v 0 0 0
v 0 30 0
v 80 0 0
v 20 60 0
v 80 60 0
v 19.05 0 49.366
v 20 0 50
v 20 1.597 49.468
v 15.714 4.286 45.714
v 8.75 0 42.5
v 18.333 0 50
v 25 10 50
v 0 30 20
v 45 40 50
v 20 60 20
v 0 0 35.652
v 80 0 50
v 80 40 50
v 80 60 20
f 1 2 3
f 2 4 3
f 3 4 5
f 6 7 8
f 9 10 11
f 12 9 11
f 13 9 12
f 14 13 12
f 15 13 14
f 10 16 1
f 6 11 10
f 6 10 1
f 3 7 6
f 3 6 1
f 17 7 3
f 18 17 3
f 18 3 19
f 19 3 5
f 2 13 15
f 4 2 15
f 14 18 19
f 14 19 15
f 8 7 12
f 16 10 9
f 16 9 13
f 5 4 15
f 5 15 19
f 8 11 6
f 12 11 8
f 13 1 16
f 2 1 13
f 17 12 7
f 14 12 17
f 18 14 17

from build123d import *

# Parameters (mm, degrees)
SKETCH1_W           = 80
SKETCH1_H           = 60
BOSS_EXTRUDE1_DEPTH = 50
CUT_EXTRUDE1_DEPTH  = 50
CUT_EXTRUDE2_DEPTH  = 124
CUT_EXTRUDE3_DEPTH  = 124
CUT_EXTRUDE4_DEPTH  = 124
CUT_EXTRUDE5_DEPTH  = 124
CUT_EXTRUDE6_DEPTH  = 124
CUT_EXTRUDE7_DEPTH  = 124
CUT_EXTRUDE8_DEPTH  = 124
CUT_EXTRUDE9_DEPTH  = 124
CUT_EXTRUDE10_DEPTH = 124
CUT_EXTRUDE11_DEPTH = 124
CUT_EXTRUDE12_DEPTH = 124
CUT_EXTRUDE14_DEPTH = 124
CUT_EXTRUDE15_DEPTH = 124
BOSS_EXTRUDE2_DEPTH = 5
SKETCH27_W          = 80
SKETCH27_H          = 50
CUT_EXTRUDE20_DEPTH = 37


with BuildPart() as part:
    # Sketch1 → Boss-Extrude1 (new body)
    with BuildSketch(Plane.XY):
        with Locations((40, 30)):
            Rectangle(SKETCH1_W, SKETCH1_H)
    extrude(amount=BOSS_EXTRUDE1_DEPTH)

    # Sketch2 → Cut-Extrude1 (cut)
    with BuildSketch(Plane.XY.offset(50)):
        Polygon((0, 30), (20, 60), (0, 60), align=None)
    extrude(amount=-CUT_EXTRUDE1_DEPTH, mode=Mode.SUBTRACT)

    # Sketch3 → Cut-Extrude2 (cut)
    with BuildSketch(Plane(origin=(80, 0, 0), x_dir=(0, 0, -1), z_dir=(1, 0, 0))):
        Polygon((-30, 60), (-50, 40), (-50, 60), align=None)
    extrude(amount=-CUT_EXTRUDE2_DEPTH, mode=Mode.SUBTRACT)

    # Sketch6 → Cut-Extrude3 (cut)
    with BuildSketch(Plane(origin=(-15.714285714, 7.857142857, 23.571428571), x_dir=(0.845154255, 0.169030851, 0.507092553), z_dir=(-0.534522484, 0.267261242, 0.801783726))):
        Polygon((42.257712736, 47.434164903), (65.922031869, 22.135943621), (42.257712736, -15.811388301), align=None)
    extrude(amount=CUT_EXTRUDE3_DEPTH, mode=Mode.SUBTRACT)

    # Sketch7 → Cut-Extrude4 (cut)
    with BuildSketch(Plane(origin=(35.714285714, 7.142857143, 21.428571429), x_dir=(0.497245158, 0.099449032, -0.861891607), z_dir=(0.845154255, 0.169030851, 0.507092553))):
        Polygon((-33.149677207, 36.869833406), (-33.149677207, -3.922322703), (-9.944903162, 54.912517839), align=None)
    extrude(amount=-CUT_EXTRUDE4_DEPTH, mode=Mode.SUBTRACT)

    # Sketch8 → Cut-Extrude5 (cut)
    with BuildSketch(Plane(origin=(-16.483516484, -3.296703297, 28.571428571), x_dir=(-0.867610081, 0.056996283, -0.493967783), z_dir=(0.497245158, 0.099449032, -0.861891607))):
        Polygon((-25.736988098, 43.821678207), (-32.829858833, 45.467562834), (-42.05059079, 5.731205399), (-18.998760899, 4.408619538), (-18.998760899, 34.607663372), align=None)
    extrude(amount=-CUT_EXTRUDE5_DEPTH, mode=Mode.SUBTRACT)

    # Sketch9 → Cut-Extrude6 (cut)
    with BuildSketch(Plane(origin=(-22.751322751, 35.264550265, 26.164021164), x_dir=(0.887896271, 0.369460193, 0.274115627), z_dir=(0.460043706, -0.713067745, -0.529050262))):
        Polygon((32.208127825, 14.089089478), (39.138944356, 16.321024445), (48.149005846, -11.657874603), align=None)
    extrude(amount=-CUT_EXTRUDE6_DEPTH, mode=Mode.SUBTRACT)

    # Sketch10 → Cut-Extrude7 (cut)
    with BuildSketch(Plane(origin=(-0.962962963, -2.407407407, 2.407407407), x_dir=(0.962250449, -0.19245009, 0.19245009), z_dir=(0.272165527, 0.680413817, -0.680413817))):
        Polygon((8.581009883, -63.639610307), (7.076241761, -60.15846923), (13.471506281, -63.639610307), align=None)
    extrude(amount=-CUT_EXTRUDE7_DEPTH, mode=Mode.SUBTRACT)

    # Sketch11 → Cut-Extrude8 (cut)
    with BuildSketch(Plane(origin=(-15.346074938, 7.943850556, 1.805420581), x_dir=(-0.092282328, 0.047769676, -0.994586361), z_dir=(0.883262889, -0.457218437, -0.103913281))):
        Polygon((-47.510608217, 39.711812283), (-44.744502297, 37.117331923), (-48.456907611, 37.426149), (-48.456907611, 38.702914935), align=None)
    extrude(amount=-CUT_EXTRUDE8_DEPTH, mode=Mode.SUBTRACT)

    # Sketch12 → Cut-Extrude9 (cut)
    with BuildSketch(Plane(origin=(-7.230769231, 36.153846154, 0), x_dir=(0.980580676, 0.196116135, 0), z_dir=(0.196116135, -0.980580676, 0))):
        Polygon((13.335897189, 50), (13.830048081, 50), (13.335897189, 46.307692308), align=None)
    extrude(amount=-CUT_EXTRUDE9_DEPTH, mode=Mode.SUBTRACT)

    # Sketch15 → Cut-Extrude10 (cut)
    with BuildSketch(Plane(origin=(0, 50.769230769, 33.846153846), x_dir=(-1, 0, 0), z_dir=(0, -0.832050294, -0.554700196))):
        Polygon((-20, 16.641005887), (-80, 16.641005887), (-80, -19.414506868), (-40, -19.414506868), align=None)
    extrude(amount=-CUT_EXTRUDE10_DEPTH, mode=Mode.SUBTRACT)

    # Sketch16 → Cut-Extrude11 (cut)
    with BuildSketch(Plane(origin=(22.352941176, 6.877828054, -10.316742081), x_dir=(-0.385755922, -0.11869413, -0.914933917), z_dir=(0.874474632, 0.269069118, -0.403603676))):
        Polygon((-44.065195676, 50.107704244), (-33.13544456, 51.465023547), (-65.924697908, 26.467726395), align=None)
    extrude(amount=-CUT_EXTRUDE11_DEPTH, mode=Mode.SUBTRACT)

    # Sketch17 → Cut-Extrude12 (cut)
    with BuildSketch(Plane(origin=(-13.474892396, 53.122171946, 6.219181106), x_dir=(0.969698736, 0.242646617, 0.028407409), z_dir=(0.24430383, -0.96312087, -0.112755614))):
        Polygon((39.280526622, 22.819756729), (34.520919906, 12.887590849), (33.567164418, 22.827971688), (35.583149731, 23.962584818), align=None)
    extrude(amount=-CUT_EXTRUDE12_DEPTH, mode=Mode.SUBTRACT)

    # Sketch22 → Cut-Extrude14 (cut)
    with BuildSketch(Plane(origin=(-14.80441324, 9.869608826, 18.916750251), x_dir=(0.821599096, 0.263693024, 0.505411628), z_dir=(-0.57006572, 0.380043813, 0.728417309))):
        Polygon((42.361795907, 43.943770636), (72.790261699, 12.335093512), (40.333231521, -23.128300335), (18.019023273, 17.346225251), align=None)
    extrude(amount=CUT_EXTRUDE14_DEPTH, mode=Mode.SUBTRACT)

    # Sketch23 → Cut-Extrude15 (cut)
    with BuildSketch(Plane(origin=(17.379185671, 15.917127194, 5.296513728), x_dir=(0.161703891, 0.148100231, -0.97566294), z_dir=(0.719498347, 0.658969121, 0.219275687))):
        Polygon((-15.07025189, 22.123368133), (-22.755667886, 20.283347912), (-41.425957995, -7.45305002), align=None)
    extrude(amount=-CUT_EXTRUDE15_DEPTH, mode=Mode.SUBTRACT)

    # Sketch26 → Boss-Extrude2 (add)
    with BuildSketch(Plane(origin=(-14.80441324, 9.869608826, 18.916750251), x_dir=(0.821599096, 0.263693024, 0.505411628), z_dir=(-0.57006572, 0.380043813, 0.728417309))):
        Polygon((18.019023273, -16.491483717), (40.333231521, -23.128300335), (72.790261699, 12.335093512), (42.361795907, 43.943770636), (18.019023273, 17.346225251), align=None)
    extrude(amount=-BOSS_EXTRUDE2_DEPTH)

    # Sketch27 → Cut-Extrude20 (cut)
    with BuildSketch(Plane.XZ):
        with Locations((40, 25)):
            Rectangle(SKETCH27_W, SKETCH27_H)
    extrude(amount=CUT_EXTRUDE20_DEPTH, mode=Mode.SUBTRACT)


solid = part.part
